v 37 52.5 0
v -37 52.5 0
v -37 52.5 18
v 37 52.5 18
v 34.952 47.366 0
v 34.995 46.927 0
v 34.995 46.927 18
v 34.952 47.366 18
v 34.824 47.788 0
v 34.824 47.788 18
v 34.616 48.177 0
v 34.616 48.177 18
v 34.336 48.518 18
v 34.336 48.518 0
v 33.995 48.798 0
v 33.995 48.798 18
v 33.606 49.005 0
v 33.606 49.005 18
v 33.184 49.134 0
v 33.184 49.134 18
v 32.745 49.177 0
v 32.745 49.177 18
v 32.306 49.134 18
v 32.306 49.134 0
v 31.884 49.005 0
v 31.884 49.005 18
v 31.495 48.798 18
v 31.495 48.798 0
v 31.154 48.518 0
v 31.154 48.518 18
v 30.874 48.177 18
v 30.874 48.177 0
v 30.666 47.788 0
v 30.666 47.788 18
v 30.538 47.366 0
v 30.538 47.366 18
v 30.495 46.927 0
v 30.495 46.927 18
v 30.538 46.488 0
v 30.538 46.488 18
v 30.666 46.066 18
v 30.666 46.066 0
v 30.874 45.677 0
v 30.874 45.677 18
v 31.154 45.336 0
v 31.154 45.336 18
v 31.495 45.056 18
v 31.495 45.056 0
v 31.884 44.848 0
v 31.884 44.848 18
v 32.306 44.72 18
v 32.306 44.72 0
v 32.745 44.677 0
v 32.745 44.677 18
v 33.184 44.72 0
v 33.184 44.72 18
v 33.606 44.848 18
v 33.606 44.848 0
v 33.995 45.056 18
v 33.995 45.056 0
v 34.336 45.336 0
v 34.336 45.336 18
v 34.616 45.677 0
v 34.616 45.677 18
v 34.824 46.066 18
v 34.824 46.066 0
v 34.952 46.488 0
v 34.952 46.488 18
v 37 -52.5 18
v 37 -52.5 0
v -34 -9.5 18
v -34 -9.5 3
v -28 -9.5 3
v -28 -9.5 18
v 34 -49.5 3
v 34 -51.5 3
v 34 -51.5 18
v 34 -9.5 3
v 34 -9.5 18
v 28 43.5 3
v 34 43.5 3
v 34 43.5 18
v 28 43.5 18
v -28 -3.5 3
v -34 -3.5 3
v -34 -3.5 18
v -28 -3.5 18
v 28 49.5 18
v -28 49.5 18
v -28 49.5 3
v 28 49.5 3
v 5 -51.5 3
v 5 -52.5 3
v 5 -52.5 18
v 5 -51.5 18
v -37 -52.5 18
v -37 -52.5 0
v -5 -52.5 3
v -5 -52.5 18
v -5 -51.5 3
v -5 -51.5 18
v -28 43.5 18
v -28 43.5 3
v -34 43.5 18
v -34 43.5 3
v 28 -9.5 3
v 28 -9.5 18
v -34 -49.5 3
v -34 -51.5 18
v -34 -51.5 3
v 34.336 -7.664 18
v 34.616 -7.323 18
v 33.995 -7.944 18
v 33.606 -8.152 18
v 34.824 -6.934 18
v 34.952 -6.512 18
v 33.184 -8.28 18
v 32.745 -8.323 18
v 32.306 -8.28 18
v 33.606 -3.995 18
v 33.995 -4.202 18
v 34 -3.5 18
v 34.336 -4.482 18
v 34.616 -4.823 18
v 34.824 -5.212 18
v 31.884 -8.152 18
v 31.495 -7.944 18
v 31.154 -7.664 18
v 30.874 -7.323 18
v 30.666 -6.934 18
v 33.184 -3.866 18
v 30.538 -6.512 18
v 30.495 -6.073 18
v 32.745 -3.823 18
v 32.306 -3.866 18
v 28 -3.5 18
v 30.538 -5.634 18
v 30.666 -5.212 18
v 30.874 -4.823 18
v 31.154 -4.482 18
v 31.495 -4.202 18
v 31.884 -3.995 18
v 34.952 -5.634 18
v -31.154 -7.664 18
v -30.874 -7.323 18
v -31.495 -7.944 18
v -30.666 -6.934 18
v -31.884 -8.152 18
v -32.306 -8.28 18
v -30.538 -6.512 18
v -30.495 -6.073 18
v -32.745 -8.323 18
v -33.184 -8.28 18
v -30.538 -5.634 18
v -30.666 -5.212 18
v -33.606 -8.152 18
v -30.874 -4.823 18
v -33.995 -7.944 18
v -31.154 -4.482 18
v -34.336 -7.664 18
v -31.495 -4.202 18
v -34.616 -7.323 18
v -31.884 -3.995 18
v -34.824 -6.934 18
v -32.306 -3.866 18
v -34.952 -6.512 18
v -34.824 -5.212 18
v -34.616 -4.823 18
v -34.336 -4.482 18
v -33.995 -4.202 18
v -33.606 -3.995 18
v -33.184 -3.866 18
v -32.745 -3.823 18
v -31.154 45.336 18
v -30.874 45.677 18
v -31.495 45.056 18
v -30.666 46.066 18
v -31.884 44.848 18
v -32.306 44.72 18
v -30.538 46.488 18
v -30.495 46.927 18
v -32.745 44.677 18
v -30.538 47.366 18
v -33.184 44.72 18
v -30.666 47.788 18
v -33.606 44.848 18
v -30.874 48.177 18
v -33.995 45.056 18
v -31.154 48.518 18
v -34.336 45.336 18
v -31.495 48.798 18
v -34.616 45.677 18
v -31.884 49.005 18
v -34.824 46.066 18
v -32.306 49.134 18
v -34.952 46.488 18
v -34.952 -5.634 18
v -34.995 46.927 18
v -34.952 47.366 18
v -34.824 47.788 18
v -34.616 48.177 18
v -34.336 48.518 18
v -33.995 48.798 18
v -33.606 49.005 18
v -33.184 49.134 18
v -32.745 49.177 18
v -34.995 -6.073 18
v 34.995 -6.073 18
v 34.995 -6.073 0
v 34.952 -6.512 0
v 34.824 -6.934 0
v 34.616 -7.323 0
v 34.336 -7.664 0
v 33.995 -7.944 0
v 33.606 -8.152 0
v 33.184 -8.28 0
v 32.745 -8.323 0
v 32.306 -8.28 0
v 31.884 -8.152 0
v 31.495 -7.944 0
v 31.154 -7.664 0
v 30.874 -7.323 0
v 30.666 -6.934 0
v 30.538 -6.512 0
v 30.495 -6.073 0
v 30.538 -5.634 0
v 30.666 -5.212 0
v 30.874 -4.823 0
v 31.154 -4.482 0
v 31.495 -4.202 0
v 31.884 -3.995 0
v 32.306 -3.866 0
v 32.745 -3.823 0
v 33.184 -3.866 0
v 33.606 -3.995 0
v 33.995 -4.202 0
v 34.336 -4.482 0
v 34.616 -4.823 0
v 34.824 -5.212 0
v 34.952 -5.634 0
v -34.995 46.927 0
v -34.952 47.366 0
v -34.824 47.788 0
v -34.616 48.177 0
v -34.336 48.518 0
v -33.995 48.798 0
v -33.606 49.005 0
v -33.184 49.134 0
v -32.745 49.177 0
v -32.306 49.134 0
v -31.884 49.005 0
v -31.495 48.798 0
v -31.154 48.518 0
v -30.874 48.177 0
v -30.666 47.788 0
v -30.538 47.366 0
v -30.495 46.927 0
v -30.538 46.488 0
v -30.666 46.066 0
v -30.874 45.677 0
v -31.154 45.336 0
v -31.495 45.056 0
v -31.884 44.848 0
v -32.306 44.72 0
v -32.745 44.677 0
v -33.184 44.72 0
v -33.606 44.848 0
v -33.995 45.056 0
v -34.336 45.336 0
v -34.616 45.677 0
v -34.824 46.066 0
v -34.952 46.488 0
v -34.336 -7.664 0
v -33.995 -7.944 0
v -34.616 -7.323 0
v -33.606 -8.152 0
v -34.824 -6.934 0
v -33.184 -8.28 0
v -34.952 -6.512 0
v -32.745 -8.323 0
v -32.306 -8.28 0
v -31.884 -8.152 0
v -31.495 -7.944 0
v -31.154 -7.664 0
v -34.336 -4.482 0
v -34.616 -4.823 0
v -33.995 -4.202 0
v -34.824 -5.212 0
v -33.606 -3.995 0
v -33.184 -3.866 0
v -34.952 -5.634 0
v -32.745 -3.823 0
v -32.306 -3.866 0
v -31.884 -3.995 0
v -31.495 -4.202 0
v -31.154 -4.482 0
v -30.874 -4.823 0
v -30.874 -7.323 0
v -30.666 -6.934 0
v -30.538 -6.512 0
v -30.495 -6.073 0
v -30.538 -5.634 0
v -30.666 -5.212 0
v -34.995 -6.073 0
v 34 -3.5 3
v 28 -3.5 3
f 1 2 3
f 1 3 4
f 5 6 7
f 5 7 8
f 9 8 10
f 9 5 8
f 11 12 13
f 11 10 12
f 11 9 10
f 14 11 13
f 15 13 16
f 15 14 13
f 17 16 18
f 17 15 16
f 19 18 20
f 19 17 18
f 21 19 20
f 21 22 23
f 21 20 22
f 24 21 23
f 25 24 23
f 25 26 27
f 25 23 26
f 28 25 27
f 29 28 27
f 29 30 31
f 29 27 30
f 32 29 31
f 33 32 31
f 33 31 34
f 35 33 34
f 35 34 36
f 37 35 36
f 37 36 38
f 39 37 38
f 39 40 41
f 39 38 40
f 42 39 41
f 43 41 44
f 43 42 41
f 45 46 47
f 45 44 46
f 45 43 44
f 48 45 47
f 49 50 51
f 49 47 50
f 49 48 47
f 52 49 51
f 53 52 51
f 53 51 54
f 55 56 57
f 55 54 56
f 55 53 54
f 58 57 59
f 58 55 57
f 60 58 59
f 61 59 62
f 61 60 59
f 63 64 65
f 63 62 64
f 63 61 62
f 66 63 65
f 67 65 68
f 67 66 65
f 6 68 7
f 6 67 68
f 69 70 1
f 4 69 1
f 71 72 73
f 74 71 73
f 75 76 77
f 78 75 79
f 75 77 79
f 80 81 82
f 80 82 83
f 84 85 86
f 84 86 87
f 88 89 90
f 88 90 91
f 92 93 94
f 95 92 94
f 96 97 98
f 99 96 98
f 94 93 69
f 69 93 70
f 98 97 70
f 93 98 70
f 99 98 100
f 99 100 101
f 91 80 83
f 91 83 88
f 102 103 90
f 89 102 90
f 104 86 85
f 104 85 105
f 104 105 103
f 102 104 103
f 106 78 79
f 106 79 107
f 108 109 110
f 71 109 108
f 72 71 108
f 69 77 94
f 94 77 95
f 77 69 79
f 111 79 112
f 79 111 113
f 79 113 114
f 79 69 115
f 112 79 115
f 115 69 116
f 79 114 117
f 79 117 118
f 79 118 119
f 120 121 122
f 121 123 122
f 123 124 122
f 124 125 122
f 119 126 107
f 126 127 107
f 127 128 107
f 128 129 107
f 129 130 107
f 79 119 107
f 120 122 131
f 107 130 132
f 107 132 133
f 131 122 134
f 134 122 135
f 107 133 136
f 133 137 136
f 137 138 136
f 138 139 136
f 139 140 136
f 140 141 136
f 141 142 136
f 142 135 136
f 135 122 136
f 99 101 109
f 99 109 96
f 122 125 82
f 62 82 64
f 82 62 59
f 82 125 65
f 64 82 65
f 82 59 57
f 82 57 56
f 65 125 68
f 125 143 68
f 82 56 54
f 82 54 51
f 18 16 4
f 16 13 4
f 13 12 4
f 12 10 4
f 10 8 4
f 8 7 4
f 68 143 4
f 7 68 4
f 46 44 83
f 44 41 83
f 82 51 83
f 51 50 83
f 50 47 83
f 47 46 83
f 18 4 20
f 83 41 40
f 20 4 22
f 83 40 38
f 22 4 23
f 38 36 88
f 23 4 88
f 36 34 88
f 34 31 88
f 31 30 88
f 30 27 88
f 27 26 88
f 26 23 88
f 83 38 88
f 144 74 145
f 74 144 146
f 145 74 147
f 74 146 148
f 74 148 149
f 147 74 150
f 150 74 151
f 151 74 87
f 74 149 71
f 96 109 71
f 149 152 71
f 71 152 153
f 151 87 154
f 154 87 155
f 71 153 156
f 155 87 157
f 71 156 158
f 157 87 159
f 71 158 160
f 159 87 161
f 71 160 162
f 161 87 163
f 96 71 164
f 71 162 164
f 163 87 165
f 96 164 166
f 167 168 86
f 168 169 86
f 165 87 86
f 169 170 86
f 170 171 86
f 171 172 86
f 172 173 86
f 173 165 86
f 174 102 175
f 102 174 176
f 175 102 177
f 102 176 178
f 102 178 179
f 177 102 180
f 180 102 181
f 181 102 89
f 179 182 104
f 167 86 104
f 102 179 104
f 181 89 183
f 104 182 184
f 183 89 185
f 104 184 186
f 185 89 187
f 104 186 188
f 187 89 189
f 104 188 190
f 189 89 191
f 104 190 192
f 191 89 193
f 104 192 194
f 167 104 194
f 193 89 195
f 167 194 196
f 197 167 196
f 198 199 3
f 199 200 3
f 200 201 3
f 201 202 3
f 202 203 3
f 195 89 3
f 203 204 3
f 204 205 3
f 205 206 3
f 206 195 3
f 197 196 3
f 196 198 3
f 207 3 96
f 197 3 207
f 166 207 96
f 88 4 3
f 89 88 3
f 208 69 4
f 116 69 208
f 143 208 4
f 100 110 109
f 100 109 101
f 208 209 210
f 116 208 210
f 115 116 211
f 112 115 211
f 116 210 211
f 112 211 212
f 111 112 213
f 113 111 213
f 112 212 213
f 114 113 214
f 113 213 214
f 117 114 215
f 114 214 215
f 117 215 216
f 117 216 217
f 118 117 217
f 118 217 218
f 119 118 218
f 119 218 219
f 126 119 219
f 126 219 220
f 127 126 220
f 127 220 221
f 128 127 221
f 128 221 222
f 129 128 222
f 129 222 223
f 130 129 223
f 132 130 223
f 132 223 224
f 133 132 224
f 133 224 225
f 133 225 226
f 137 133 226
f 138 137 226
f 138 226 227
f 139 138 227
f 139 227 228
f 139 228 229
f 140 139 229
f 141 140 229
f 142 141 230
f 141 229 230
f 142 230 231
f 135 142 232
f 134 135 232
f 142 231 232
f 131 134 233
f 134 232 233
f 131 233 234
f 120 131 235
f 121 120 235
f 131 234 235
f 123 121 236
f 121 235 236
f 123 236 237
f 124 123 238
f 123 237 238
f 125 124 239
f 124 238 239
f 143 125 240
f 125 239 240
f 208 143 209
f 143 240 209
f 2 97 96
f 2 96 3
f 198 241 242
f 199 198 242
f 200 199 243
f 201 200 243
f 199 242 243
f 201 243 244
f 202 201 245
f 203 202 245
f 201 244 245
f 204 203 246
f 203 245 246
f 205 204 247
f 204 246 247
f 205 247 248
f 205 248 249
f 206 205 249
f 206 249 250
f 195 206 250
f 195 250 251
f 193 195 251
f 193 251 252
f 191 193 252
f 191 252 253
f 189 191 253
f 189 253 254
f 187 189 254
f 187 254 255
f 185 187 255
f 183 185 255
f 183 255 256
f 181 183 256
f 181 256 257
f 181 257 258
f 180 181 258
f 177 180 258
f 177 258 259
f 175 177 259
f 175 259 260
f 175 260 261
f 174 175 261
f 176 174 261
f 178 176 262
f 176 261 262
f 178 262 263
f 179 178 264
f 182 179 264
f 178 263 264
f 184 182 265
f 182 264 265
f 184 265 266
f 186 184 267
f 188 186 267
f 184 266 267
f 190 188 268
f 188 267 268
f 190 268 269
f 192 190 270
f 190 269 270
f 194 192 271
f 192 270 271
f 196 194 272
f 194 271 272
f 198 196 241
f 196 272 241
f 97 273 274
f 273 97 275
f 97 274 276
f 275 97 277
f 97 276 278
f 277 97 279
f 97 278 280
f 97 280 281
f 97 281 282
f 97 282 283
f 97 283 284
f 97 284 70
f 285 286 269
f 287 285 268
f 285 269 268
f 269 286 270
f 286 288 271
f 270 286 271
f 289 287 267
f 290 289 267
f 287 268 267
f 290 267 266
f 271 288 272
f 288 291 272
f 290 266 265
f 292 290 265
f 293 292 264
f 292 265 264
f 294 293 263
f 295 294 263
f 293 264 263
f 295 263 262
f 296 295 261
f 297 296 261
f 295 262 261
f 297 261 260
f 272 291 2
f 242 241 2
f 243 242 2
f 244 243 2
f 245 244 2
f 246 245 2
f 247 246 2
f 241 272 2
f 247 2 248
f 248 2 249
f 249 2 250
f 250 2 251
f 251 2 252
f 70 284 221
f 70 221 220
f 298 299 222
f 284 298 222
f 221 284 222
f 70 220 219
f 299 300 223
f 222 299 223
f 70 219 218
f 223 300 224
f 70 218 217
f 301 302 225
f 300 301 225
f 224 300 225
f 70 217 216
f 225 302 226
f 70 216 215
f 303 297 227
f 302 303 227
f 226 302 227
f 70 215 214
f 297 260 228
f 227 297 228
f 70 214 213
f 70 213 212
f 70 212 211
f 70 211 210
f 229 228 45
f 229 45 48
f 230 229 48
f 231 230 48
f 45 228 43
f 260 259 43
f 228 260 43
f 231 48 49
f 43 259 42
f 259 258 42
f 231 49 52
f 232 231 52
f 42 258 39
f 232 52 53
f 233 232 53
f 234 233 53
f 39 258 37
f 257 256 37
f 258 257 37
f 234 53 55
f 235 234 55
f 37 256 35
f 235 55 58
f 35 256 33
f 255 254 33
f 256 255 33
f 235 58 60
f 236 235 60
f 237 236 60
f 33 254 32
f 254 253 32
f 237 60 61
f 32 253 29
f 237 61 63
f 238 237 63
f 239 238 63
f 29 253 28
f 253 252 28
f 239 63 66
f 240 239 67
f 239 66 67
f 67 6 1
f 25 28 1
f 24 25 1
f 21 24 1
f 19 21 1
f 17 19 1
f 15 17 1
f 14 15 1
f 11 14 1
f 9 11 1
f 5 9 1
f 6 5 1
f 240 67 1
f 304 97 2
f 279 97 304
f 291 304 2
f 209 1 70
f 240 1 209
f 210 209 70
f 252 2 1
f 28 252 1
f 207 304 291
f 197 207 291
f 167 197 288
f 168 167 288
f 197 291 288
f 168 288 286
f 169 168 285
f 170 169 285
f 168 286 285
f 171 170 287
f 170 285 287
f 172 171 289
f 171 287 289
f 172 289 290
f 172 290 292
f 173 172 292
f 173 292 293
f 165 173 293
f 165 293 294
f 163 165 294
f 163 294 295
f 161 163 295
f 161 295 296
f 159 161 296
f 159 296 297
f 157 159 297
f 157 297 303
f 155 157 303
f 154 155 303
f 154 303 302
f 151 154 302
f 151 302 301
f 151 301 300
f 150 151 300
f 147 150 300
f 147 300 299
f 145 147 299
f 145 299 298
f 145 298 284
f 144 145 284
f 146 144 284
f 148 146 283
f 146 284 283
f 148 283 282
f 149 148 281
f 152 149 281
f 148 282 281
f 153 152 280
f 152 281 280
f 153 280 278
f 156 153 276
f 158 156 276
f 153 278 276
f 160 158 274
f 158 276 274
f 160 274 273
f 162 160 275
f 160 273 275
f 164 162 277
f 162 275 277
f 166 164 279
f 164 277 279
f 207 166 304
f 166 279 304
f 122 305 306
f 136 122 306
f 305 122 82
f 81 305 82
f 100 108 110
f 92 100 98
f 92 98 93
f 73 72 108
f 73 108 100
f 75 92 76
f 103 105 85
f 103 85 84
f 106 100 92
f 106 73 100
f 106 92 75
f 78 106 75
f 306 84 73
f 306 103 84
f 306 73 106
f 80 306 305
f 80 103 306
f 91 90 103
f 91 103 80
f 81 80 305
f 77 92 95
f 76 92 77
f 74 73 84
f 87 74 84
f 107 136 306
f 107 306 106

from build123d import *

# Parameters (mm, degrees)
ESQUISSE1_W                          = 74
ESQUISSE1_H                          = 105
BOSS_EXTRU_1_DEPTH                   = 18
ESQUISSE2_W                          = 68
ESQUISSE2_H                          = 99
ENL_V_MAT_EXTRU_1_DEPTH              = 15
ESQUISSE3_W                          = 6
ESQUISSE3_H                          = 6
BOSS_EXTRU_2_DEPTH                   = 15
D_GAGEMENT_M41_D                     = 4.5
ESQUISSE7_W                          = 10
ESQUISSE7_H                          = 30
ENL_V_MAT_EXTRU_2_DEPTH              = 15
R_P_TITION_LIN_AIRE3_COUNT           = 2
R_P_TITION_LIN_AIRE3_PITCH           = 53
R_P_TITION_LIN_AIRE3_COPY_1_SKETCH_W = 6
R_P_TITION_LIN_AIRE3_COPY_1_SKETCH_H = 6
R_P_TITION_LIN_AIRE3_COPY_1_DEPTH    = 15
R_P_TITION_LIN_AIRE3_COPY_2_D        = 4.5
ESQUISSE8_W                          = 68
ESQUISSE8_H                          = 33.530286581
ENL_V_MAT_EXTRU_3_DEPTH              = 2


with BuildPart() as part:
    # Esquisse1 → Boss.-Extru.1 (new body)
    with BuildSketch(Plane.XY):
        Rectangle(ESQUISSE1_W, ESQUISSE1_H)
    extrude(amount=BOSS_EXTRU_1_DEPTH)

    # Esquisse2 → Enlèv. mat.-Extru.1 (cut)
    with BuildSketch(Plane.XY.offset(18)):
        Rectangle(ESQUISSE2_W, ESQUISSE2_H)
    extrude(amount=-ENL_V_MAT_EXTRU_1_DEPTH, mode=Mode.SUBTRACT)

    # Esquisse3 → Boss.-Extru.2 (add)
    with BuildSketch(Plane.XY.offset(18)):
        with Locations((-31, 46.5)):
            Rectangle(ESQUISSE3_W, ESQUISSE3_H)
    boss_extru_2 = extrude(amount=-BOSS_EXTRU_2_DEPTH)

    # Dégagement M41 (through all)
    with Locations(Plane.XY.offset(18)):
        with Locations((-32.745076206, 46.926751476)):
            d_gagement_m41 = Hole(D_GAGEMENT_M41_D / 2)

    # Esquisse7 → Enlèv. mat.-Extru.2 (cut)
    with BuildSketch(Plane.XZ.offset(52.5)):
        with Locations((0, 18)):
            Rectangle(ESQUISSE7_W, ESQUISSE7_H)
    extrude(amount=-ENL_V_MAT_EXTRU_2_DEPTH, mode=Mode.SUBTRACT)

    # Symétrie5: Boss.-Extru.2, Dégagement M41 across plane
    add(boss_extru_2.mirror(Plane(origin=(0, 0, 0), x_dir=(0, 0, 1), z_dir=(1, 0, 0))))
    add(d_gagement_m41.mirror(Plane(origin=(0, 0, 0), x_dir=(0, 0, 1), z_dir=(1, 0, 0))), mode=Mode.SUBTRACT)

    # Répétition linéaire3: Boss.-Extru.2, Dégagement M41 ×2
    with Locations(*[(0, -i * R_P_TITION_LIN_AIRE3_PITCH, 0) for i in range(1, R_P_TITION_LIN_AIRE3_COUNT)]):
        add(boss_extru_2)
        add(d_gagement_m41, mode=Mode.SUBTRACT)

    # Répétition linéaire3 copy 1 sketch → Répétition linéaire3 copy 1 (add)
    with BuildSketch(Plane(origin=(0, -53, 18), x_dir=(-1, 0, 0), z_dir=(0, 0, 1))):
        with Locations((-31, -46.5)):
            Rectangle(R_P_TITION_LIN_AIRE3_COPY_1_SKETCH_W, R_P_TITION_LIN_AIRE3_COPY_1_SKETCH_H)
    extrude(amount=-R_P_TITION_LIN_AIRE3_COPY_1_DEPTH)

    # Répétition linéaire3 copy 2 (through all)
    with Locations(Plane(origin=(0, -53, 18), x_dir=(-1, 0, 0), z_dir=(0, 0, 1))):
        with Locations((-32.745076206, -46.926751476)):
            Hole(R_P_TITION_LIN_AIRE3_COPY_2_D / 2)

    # Esquisse8 → Enlèv. mat.-Extru.3 (cut)
    with BuildSketch(Plane(origin=(0, -49.5, 0), x_dir=(1, 0, 0), z_dir=(0, 1, 0))):
        with Locations((0, -19.765143291)):
            Rectangle(ESQUISSE8_W, ESQUISSE8_H)
    extrude(amount=-ENL_V_MAT_EXTRU_3_DEPTH, mode=Mode.SUBTRACT)


solid = part.part
